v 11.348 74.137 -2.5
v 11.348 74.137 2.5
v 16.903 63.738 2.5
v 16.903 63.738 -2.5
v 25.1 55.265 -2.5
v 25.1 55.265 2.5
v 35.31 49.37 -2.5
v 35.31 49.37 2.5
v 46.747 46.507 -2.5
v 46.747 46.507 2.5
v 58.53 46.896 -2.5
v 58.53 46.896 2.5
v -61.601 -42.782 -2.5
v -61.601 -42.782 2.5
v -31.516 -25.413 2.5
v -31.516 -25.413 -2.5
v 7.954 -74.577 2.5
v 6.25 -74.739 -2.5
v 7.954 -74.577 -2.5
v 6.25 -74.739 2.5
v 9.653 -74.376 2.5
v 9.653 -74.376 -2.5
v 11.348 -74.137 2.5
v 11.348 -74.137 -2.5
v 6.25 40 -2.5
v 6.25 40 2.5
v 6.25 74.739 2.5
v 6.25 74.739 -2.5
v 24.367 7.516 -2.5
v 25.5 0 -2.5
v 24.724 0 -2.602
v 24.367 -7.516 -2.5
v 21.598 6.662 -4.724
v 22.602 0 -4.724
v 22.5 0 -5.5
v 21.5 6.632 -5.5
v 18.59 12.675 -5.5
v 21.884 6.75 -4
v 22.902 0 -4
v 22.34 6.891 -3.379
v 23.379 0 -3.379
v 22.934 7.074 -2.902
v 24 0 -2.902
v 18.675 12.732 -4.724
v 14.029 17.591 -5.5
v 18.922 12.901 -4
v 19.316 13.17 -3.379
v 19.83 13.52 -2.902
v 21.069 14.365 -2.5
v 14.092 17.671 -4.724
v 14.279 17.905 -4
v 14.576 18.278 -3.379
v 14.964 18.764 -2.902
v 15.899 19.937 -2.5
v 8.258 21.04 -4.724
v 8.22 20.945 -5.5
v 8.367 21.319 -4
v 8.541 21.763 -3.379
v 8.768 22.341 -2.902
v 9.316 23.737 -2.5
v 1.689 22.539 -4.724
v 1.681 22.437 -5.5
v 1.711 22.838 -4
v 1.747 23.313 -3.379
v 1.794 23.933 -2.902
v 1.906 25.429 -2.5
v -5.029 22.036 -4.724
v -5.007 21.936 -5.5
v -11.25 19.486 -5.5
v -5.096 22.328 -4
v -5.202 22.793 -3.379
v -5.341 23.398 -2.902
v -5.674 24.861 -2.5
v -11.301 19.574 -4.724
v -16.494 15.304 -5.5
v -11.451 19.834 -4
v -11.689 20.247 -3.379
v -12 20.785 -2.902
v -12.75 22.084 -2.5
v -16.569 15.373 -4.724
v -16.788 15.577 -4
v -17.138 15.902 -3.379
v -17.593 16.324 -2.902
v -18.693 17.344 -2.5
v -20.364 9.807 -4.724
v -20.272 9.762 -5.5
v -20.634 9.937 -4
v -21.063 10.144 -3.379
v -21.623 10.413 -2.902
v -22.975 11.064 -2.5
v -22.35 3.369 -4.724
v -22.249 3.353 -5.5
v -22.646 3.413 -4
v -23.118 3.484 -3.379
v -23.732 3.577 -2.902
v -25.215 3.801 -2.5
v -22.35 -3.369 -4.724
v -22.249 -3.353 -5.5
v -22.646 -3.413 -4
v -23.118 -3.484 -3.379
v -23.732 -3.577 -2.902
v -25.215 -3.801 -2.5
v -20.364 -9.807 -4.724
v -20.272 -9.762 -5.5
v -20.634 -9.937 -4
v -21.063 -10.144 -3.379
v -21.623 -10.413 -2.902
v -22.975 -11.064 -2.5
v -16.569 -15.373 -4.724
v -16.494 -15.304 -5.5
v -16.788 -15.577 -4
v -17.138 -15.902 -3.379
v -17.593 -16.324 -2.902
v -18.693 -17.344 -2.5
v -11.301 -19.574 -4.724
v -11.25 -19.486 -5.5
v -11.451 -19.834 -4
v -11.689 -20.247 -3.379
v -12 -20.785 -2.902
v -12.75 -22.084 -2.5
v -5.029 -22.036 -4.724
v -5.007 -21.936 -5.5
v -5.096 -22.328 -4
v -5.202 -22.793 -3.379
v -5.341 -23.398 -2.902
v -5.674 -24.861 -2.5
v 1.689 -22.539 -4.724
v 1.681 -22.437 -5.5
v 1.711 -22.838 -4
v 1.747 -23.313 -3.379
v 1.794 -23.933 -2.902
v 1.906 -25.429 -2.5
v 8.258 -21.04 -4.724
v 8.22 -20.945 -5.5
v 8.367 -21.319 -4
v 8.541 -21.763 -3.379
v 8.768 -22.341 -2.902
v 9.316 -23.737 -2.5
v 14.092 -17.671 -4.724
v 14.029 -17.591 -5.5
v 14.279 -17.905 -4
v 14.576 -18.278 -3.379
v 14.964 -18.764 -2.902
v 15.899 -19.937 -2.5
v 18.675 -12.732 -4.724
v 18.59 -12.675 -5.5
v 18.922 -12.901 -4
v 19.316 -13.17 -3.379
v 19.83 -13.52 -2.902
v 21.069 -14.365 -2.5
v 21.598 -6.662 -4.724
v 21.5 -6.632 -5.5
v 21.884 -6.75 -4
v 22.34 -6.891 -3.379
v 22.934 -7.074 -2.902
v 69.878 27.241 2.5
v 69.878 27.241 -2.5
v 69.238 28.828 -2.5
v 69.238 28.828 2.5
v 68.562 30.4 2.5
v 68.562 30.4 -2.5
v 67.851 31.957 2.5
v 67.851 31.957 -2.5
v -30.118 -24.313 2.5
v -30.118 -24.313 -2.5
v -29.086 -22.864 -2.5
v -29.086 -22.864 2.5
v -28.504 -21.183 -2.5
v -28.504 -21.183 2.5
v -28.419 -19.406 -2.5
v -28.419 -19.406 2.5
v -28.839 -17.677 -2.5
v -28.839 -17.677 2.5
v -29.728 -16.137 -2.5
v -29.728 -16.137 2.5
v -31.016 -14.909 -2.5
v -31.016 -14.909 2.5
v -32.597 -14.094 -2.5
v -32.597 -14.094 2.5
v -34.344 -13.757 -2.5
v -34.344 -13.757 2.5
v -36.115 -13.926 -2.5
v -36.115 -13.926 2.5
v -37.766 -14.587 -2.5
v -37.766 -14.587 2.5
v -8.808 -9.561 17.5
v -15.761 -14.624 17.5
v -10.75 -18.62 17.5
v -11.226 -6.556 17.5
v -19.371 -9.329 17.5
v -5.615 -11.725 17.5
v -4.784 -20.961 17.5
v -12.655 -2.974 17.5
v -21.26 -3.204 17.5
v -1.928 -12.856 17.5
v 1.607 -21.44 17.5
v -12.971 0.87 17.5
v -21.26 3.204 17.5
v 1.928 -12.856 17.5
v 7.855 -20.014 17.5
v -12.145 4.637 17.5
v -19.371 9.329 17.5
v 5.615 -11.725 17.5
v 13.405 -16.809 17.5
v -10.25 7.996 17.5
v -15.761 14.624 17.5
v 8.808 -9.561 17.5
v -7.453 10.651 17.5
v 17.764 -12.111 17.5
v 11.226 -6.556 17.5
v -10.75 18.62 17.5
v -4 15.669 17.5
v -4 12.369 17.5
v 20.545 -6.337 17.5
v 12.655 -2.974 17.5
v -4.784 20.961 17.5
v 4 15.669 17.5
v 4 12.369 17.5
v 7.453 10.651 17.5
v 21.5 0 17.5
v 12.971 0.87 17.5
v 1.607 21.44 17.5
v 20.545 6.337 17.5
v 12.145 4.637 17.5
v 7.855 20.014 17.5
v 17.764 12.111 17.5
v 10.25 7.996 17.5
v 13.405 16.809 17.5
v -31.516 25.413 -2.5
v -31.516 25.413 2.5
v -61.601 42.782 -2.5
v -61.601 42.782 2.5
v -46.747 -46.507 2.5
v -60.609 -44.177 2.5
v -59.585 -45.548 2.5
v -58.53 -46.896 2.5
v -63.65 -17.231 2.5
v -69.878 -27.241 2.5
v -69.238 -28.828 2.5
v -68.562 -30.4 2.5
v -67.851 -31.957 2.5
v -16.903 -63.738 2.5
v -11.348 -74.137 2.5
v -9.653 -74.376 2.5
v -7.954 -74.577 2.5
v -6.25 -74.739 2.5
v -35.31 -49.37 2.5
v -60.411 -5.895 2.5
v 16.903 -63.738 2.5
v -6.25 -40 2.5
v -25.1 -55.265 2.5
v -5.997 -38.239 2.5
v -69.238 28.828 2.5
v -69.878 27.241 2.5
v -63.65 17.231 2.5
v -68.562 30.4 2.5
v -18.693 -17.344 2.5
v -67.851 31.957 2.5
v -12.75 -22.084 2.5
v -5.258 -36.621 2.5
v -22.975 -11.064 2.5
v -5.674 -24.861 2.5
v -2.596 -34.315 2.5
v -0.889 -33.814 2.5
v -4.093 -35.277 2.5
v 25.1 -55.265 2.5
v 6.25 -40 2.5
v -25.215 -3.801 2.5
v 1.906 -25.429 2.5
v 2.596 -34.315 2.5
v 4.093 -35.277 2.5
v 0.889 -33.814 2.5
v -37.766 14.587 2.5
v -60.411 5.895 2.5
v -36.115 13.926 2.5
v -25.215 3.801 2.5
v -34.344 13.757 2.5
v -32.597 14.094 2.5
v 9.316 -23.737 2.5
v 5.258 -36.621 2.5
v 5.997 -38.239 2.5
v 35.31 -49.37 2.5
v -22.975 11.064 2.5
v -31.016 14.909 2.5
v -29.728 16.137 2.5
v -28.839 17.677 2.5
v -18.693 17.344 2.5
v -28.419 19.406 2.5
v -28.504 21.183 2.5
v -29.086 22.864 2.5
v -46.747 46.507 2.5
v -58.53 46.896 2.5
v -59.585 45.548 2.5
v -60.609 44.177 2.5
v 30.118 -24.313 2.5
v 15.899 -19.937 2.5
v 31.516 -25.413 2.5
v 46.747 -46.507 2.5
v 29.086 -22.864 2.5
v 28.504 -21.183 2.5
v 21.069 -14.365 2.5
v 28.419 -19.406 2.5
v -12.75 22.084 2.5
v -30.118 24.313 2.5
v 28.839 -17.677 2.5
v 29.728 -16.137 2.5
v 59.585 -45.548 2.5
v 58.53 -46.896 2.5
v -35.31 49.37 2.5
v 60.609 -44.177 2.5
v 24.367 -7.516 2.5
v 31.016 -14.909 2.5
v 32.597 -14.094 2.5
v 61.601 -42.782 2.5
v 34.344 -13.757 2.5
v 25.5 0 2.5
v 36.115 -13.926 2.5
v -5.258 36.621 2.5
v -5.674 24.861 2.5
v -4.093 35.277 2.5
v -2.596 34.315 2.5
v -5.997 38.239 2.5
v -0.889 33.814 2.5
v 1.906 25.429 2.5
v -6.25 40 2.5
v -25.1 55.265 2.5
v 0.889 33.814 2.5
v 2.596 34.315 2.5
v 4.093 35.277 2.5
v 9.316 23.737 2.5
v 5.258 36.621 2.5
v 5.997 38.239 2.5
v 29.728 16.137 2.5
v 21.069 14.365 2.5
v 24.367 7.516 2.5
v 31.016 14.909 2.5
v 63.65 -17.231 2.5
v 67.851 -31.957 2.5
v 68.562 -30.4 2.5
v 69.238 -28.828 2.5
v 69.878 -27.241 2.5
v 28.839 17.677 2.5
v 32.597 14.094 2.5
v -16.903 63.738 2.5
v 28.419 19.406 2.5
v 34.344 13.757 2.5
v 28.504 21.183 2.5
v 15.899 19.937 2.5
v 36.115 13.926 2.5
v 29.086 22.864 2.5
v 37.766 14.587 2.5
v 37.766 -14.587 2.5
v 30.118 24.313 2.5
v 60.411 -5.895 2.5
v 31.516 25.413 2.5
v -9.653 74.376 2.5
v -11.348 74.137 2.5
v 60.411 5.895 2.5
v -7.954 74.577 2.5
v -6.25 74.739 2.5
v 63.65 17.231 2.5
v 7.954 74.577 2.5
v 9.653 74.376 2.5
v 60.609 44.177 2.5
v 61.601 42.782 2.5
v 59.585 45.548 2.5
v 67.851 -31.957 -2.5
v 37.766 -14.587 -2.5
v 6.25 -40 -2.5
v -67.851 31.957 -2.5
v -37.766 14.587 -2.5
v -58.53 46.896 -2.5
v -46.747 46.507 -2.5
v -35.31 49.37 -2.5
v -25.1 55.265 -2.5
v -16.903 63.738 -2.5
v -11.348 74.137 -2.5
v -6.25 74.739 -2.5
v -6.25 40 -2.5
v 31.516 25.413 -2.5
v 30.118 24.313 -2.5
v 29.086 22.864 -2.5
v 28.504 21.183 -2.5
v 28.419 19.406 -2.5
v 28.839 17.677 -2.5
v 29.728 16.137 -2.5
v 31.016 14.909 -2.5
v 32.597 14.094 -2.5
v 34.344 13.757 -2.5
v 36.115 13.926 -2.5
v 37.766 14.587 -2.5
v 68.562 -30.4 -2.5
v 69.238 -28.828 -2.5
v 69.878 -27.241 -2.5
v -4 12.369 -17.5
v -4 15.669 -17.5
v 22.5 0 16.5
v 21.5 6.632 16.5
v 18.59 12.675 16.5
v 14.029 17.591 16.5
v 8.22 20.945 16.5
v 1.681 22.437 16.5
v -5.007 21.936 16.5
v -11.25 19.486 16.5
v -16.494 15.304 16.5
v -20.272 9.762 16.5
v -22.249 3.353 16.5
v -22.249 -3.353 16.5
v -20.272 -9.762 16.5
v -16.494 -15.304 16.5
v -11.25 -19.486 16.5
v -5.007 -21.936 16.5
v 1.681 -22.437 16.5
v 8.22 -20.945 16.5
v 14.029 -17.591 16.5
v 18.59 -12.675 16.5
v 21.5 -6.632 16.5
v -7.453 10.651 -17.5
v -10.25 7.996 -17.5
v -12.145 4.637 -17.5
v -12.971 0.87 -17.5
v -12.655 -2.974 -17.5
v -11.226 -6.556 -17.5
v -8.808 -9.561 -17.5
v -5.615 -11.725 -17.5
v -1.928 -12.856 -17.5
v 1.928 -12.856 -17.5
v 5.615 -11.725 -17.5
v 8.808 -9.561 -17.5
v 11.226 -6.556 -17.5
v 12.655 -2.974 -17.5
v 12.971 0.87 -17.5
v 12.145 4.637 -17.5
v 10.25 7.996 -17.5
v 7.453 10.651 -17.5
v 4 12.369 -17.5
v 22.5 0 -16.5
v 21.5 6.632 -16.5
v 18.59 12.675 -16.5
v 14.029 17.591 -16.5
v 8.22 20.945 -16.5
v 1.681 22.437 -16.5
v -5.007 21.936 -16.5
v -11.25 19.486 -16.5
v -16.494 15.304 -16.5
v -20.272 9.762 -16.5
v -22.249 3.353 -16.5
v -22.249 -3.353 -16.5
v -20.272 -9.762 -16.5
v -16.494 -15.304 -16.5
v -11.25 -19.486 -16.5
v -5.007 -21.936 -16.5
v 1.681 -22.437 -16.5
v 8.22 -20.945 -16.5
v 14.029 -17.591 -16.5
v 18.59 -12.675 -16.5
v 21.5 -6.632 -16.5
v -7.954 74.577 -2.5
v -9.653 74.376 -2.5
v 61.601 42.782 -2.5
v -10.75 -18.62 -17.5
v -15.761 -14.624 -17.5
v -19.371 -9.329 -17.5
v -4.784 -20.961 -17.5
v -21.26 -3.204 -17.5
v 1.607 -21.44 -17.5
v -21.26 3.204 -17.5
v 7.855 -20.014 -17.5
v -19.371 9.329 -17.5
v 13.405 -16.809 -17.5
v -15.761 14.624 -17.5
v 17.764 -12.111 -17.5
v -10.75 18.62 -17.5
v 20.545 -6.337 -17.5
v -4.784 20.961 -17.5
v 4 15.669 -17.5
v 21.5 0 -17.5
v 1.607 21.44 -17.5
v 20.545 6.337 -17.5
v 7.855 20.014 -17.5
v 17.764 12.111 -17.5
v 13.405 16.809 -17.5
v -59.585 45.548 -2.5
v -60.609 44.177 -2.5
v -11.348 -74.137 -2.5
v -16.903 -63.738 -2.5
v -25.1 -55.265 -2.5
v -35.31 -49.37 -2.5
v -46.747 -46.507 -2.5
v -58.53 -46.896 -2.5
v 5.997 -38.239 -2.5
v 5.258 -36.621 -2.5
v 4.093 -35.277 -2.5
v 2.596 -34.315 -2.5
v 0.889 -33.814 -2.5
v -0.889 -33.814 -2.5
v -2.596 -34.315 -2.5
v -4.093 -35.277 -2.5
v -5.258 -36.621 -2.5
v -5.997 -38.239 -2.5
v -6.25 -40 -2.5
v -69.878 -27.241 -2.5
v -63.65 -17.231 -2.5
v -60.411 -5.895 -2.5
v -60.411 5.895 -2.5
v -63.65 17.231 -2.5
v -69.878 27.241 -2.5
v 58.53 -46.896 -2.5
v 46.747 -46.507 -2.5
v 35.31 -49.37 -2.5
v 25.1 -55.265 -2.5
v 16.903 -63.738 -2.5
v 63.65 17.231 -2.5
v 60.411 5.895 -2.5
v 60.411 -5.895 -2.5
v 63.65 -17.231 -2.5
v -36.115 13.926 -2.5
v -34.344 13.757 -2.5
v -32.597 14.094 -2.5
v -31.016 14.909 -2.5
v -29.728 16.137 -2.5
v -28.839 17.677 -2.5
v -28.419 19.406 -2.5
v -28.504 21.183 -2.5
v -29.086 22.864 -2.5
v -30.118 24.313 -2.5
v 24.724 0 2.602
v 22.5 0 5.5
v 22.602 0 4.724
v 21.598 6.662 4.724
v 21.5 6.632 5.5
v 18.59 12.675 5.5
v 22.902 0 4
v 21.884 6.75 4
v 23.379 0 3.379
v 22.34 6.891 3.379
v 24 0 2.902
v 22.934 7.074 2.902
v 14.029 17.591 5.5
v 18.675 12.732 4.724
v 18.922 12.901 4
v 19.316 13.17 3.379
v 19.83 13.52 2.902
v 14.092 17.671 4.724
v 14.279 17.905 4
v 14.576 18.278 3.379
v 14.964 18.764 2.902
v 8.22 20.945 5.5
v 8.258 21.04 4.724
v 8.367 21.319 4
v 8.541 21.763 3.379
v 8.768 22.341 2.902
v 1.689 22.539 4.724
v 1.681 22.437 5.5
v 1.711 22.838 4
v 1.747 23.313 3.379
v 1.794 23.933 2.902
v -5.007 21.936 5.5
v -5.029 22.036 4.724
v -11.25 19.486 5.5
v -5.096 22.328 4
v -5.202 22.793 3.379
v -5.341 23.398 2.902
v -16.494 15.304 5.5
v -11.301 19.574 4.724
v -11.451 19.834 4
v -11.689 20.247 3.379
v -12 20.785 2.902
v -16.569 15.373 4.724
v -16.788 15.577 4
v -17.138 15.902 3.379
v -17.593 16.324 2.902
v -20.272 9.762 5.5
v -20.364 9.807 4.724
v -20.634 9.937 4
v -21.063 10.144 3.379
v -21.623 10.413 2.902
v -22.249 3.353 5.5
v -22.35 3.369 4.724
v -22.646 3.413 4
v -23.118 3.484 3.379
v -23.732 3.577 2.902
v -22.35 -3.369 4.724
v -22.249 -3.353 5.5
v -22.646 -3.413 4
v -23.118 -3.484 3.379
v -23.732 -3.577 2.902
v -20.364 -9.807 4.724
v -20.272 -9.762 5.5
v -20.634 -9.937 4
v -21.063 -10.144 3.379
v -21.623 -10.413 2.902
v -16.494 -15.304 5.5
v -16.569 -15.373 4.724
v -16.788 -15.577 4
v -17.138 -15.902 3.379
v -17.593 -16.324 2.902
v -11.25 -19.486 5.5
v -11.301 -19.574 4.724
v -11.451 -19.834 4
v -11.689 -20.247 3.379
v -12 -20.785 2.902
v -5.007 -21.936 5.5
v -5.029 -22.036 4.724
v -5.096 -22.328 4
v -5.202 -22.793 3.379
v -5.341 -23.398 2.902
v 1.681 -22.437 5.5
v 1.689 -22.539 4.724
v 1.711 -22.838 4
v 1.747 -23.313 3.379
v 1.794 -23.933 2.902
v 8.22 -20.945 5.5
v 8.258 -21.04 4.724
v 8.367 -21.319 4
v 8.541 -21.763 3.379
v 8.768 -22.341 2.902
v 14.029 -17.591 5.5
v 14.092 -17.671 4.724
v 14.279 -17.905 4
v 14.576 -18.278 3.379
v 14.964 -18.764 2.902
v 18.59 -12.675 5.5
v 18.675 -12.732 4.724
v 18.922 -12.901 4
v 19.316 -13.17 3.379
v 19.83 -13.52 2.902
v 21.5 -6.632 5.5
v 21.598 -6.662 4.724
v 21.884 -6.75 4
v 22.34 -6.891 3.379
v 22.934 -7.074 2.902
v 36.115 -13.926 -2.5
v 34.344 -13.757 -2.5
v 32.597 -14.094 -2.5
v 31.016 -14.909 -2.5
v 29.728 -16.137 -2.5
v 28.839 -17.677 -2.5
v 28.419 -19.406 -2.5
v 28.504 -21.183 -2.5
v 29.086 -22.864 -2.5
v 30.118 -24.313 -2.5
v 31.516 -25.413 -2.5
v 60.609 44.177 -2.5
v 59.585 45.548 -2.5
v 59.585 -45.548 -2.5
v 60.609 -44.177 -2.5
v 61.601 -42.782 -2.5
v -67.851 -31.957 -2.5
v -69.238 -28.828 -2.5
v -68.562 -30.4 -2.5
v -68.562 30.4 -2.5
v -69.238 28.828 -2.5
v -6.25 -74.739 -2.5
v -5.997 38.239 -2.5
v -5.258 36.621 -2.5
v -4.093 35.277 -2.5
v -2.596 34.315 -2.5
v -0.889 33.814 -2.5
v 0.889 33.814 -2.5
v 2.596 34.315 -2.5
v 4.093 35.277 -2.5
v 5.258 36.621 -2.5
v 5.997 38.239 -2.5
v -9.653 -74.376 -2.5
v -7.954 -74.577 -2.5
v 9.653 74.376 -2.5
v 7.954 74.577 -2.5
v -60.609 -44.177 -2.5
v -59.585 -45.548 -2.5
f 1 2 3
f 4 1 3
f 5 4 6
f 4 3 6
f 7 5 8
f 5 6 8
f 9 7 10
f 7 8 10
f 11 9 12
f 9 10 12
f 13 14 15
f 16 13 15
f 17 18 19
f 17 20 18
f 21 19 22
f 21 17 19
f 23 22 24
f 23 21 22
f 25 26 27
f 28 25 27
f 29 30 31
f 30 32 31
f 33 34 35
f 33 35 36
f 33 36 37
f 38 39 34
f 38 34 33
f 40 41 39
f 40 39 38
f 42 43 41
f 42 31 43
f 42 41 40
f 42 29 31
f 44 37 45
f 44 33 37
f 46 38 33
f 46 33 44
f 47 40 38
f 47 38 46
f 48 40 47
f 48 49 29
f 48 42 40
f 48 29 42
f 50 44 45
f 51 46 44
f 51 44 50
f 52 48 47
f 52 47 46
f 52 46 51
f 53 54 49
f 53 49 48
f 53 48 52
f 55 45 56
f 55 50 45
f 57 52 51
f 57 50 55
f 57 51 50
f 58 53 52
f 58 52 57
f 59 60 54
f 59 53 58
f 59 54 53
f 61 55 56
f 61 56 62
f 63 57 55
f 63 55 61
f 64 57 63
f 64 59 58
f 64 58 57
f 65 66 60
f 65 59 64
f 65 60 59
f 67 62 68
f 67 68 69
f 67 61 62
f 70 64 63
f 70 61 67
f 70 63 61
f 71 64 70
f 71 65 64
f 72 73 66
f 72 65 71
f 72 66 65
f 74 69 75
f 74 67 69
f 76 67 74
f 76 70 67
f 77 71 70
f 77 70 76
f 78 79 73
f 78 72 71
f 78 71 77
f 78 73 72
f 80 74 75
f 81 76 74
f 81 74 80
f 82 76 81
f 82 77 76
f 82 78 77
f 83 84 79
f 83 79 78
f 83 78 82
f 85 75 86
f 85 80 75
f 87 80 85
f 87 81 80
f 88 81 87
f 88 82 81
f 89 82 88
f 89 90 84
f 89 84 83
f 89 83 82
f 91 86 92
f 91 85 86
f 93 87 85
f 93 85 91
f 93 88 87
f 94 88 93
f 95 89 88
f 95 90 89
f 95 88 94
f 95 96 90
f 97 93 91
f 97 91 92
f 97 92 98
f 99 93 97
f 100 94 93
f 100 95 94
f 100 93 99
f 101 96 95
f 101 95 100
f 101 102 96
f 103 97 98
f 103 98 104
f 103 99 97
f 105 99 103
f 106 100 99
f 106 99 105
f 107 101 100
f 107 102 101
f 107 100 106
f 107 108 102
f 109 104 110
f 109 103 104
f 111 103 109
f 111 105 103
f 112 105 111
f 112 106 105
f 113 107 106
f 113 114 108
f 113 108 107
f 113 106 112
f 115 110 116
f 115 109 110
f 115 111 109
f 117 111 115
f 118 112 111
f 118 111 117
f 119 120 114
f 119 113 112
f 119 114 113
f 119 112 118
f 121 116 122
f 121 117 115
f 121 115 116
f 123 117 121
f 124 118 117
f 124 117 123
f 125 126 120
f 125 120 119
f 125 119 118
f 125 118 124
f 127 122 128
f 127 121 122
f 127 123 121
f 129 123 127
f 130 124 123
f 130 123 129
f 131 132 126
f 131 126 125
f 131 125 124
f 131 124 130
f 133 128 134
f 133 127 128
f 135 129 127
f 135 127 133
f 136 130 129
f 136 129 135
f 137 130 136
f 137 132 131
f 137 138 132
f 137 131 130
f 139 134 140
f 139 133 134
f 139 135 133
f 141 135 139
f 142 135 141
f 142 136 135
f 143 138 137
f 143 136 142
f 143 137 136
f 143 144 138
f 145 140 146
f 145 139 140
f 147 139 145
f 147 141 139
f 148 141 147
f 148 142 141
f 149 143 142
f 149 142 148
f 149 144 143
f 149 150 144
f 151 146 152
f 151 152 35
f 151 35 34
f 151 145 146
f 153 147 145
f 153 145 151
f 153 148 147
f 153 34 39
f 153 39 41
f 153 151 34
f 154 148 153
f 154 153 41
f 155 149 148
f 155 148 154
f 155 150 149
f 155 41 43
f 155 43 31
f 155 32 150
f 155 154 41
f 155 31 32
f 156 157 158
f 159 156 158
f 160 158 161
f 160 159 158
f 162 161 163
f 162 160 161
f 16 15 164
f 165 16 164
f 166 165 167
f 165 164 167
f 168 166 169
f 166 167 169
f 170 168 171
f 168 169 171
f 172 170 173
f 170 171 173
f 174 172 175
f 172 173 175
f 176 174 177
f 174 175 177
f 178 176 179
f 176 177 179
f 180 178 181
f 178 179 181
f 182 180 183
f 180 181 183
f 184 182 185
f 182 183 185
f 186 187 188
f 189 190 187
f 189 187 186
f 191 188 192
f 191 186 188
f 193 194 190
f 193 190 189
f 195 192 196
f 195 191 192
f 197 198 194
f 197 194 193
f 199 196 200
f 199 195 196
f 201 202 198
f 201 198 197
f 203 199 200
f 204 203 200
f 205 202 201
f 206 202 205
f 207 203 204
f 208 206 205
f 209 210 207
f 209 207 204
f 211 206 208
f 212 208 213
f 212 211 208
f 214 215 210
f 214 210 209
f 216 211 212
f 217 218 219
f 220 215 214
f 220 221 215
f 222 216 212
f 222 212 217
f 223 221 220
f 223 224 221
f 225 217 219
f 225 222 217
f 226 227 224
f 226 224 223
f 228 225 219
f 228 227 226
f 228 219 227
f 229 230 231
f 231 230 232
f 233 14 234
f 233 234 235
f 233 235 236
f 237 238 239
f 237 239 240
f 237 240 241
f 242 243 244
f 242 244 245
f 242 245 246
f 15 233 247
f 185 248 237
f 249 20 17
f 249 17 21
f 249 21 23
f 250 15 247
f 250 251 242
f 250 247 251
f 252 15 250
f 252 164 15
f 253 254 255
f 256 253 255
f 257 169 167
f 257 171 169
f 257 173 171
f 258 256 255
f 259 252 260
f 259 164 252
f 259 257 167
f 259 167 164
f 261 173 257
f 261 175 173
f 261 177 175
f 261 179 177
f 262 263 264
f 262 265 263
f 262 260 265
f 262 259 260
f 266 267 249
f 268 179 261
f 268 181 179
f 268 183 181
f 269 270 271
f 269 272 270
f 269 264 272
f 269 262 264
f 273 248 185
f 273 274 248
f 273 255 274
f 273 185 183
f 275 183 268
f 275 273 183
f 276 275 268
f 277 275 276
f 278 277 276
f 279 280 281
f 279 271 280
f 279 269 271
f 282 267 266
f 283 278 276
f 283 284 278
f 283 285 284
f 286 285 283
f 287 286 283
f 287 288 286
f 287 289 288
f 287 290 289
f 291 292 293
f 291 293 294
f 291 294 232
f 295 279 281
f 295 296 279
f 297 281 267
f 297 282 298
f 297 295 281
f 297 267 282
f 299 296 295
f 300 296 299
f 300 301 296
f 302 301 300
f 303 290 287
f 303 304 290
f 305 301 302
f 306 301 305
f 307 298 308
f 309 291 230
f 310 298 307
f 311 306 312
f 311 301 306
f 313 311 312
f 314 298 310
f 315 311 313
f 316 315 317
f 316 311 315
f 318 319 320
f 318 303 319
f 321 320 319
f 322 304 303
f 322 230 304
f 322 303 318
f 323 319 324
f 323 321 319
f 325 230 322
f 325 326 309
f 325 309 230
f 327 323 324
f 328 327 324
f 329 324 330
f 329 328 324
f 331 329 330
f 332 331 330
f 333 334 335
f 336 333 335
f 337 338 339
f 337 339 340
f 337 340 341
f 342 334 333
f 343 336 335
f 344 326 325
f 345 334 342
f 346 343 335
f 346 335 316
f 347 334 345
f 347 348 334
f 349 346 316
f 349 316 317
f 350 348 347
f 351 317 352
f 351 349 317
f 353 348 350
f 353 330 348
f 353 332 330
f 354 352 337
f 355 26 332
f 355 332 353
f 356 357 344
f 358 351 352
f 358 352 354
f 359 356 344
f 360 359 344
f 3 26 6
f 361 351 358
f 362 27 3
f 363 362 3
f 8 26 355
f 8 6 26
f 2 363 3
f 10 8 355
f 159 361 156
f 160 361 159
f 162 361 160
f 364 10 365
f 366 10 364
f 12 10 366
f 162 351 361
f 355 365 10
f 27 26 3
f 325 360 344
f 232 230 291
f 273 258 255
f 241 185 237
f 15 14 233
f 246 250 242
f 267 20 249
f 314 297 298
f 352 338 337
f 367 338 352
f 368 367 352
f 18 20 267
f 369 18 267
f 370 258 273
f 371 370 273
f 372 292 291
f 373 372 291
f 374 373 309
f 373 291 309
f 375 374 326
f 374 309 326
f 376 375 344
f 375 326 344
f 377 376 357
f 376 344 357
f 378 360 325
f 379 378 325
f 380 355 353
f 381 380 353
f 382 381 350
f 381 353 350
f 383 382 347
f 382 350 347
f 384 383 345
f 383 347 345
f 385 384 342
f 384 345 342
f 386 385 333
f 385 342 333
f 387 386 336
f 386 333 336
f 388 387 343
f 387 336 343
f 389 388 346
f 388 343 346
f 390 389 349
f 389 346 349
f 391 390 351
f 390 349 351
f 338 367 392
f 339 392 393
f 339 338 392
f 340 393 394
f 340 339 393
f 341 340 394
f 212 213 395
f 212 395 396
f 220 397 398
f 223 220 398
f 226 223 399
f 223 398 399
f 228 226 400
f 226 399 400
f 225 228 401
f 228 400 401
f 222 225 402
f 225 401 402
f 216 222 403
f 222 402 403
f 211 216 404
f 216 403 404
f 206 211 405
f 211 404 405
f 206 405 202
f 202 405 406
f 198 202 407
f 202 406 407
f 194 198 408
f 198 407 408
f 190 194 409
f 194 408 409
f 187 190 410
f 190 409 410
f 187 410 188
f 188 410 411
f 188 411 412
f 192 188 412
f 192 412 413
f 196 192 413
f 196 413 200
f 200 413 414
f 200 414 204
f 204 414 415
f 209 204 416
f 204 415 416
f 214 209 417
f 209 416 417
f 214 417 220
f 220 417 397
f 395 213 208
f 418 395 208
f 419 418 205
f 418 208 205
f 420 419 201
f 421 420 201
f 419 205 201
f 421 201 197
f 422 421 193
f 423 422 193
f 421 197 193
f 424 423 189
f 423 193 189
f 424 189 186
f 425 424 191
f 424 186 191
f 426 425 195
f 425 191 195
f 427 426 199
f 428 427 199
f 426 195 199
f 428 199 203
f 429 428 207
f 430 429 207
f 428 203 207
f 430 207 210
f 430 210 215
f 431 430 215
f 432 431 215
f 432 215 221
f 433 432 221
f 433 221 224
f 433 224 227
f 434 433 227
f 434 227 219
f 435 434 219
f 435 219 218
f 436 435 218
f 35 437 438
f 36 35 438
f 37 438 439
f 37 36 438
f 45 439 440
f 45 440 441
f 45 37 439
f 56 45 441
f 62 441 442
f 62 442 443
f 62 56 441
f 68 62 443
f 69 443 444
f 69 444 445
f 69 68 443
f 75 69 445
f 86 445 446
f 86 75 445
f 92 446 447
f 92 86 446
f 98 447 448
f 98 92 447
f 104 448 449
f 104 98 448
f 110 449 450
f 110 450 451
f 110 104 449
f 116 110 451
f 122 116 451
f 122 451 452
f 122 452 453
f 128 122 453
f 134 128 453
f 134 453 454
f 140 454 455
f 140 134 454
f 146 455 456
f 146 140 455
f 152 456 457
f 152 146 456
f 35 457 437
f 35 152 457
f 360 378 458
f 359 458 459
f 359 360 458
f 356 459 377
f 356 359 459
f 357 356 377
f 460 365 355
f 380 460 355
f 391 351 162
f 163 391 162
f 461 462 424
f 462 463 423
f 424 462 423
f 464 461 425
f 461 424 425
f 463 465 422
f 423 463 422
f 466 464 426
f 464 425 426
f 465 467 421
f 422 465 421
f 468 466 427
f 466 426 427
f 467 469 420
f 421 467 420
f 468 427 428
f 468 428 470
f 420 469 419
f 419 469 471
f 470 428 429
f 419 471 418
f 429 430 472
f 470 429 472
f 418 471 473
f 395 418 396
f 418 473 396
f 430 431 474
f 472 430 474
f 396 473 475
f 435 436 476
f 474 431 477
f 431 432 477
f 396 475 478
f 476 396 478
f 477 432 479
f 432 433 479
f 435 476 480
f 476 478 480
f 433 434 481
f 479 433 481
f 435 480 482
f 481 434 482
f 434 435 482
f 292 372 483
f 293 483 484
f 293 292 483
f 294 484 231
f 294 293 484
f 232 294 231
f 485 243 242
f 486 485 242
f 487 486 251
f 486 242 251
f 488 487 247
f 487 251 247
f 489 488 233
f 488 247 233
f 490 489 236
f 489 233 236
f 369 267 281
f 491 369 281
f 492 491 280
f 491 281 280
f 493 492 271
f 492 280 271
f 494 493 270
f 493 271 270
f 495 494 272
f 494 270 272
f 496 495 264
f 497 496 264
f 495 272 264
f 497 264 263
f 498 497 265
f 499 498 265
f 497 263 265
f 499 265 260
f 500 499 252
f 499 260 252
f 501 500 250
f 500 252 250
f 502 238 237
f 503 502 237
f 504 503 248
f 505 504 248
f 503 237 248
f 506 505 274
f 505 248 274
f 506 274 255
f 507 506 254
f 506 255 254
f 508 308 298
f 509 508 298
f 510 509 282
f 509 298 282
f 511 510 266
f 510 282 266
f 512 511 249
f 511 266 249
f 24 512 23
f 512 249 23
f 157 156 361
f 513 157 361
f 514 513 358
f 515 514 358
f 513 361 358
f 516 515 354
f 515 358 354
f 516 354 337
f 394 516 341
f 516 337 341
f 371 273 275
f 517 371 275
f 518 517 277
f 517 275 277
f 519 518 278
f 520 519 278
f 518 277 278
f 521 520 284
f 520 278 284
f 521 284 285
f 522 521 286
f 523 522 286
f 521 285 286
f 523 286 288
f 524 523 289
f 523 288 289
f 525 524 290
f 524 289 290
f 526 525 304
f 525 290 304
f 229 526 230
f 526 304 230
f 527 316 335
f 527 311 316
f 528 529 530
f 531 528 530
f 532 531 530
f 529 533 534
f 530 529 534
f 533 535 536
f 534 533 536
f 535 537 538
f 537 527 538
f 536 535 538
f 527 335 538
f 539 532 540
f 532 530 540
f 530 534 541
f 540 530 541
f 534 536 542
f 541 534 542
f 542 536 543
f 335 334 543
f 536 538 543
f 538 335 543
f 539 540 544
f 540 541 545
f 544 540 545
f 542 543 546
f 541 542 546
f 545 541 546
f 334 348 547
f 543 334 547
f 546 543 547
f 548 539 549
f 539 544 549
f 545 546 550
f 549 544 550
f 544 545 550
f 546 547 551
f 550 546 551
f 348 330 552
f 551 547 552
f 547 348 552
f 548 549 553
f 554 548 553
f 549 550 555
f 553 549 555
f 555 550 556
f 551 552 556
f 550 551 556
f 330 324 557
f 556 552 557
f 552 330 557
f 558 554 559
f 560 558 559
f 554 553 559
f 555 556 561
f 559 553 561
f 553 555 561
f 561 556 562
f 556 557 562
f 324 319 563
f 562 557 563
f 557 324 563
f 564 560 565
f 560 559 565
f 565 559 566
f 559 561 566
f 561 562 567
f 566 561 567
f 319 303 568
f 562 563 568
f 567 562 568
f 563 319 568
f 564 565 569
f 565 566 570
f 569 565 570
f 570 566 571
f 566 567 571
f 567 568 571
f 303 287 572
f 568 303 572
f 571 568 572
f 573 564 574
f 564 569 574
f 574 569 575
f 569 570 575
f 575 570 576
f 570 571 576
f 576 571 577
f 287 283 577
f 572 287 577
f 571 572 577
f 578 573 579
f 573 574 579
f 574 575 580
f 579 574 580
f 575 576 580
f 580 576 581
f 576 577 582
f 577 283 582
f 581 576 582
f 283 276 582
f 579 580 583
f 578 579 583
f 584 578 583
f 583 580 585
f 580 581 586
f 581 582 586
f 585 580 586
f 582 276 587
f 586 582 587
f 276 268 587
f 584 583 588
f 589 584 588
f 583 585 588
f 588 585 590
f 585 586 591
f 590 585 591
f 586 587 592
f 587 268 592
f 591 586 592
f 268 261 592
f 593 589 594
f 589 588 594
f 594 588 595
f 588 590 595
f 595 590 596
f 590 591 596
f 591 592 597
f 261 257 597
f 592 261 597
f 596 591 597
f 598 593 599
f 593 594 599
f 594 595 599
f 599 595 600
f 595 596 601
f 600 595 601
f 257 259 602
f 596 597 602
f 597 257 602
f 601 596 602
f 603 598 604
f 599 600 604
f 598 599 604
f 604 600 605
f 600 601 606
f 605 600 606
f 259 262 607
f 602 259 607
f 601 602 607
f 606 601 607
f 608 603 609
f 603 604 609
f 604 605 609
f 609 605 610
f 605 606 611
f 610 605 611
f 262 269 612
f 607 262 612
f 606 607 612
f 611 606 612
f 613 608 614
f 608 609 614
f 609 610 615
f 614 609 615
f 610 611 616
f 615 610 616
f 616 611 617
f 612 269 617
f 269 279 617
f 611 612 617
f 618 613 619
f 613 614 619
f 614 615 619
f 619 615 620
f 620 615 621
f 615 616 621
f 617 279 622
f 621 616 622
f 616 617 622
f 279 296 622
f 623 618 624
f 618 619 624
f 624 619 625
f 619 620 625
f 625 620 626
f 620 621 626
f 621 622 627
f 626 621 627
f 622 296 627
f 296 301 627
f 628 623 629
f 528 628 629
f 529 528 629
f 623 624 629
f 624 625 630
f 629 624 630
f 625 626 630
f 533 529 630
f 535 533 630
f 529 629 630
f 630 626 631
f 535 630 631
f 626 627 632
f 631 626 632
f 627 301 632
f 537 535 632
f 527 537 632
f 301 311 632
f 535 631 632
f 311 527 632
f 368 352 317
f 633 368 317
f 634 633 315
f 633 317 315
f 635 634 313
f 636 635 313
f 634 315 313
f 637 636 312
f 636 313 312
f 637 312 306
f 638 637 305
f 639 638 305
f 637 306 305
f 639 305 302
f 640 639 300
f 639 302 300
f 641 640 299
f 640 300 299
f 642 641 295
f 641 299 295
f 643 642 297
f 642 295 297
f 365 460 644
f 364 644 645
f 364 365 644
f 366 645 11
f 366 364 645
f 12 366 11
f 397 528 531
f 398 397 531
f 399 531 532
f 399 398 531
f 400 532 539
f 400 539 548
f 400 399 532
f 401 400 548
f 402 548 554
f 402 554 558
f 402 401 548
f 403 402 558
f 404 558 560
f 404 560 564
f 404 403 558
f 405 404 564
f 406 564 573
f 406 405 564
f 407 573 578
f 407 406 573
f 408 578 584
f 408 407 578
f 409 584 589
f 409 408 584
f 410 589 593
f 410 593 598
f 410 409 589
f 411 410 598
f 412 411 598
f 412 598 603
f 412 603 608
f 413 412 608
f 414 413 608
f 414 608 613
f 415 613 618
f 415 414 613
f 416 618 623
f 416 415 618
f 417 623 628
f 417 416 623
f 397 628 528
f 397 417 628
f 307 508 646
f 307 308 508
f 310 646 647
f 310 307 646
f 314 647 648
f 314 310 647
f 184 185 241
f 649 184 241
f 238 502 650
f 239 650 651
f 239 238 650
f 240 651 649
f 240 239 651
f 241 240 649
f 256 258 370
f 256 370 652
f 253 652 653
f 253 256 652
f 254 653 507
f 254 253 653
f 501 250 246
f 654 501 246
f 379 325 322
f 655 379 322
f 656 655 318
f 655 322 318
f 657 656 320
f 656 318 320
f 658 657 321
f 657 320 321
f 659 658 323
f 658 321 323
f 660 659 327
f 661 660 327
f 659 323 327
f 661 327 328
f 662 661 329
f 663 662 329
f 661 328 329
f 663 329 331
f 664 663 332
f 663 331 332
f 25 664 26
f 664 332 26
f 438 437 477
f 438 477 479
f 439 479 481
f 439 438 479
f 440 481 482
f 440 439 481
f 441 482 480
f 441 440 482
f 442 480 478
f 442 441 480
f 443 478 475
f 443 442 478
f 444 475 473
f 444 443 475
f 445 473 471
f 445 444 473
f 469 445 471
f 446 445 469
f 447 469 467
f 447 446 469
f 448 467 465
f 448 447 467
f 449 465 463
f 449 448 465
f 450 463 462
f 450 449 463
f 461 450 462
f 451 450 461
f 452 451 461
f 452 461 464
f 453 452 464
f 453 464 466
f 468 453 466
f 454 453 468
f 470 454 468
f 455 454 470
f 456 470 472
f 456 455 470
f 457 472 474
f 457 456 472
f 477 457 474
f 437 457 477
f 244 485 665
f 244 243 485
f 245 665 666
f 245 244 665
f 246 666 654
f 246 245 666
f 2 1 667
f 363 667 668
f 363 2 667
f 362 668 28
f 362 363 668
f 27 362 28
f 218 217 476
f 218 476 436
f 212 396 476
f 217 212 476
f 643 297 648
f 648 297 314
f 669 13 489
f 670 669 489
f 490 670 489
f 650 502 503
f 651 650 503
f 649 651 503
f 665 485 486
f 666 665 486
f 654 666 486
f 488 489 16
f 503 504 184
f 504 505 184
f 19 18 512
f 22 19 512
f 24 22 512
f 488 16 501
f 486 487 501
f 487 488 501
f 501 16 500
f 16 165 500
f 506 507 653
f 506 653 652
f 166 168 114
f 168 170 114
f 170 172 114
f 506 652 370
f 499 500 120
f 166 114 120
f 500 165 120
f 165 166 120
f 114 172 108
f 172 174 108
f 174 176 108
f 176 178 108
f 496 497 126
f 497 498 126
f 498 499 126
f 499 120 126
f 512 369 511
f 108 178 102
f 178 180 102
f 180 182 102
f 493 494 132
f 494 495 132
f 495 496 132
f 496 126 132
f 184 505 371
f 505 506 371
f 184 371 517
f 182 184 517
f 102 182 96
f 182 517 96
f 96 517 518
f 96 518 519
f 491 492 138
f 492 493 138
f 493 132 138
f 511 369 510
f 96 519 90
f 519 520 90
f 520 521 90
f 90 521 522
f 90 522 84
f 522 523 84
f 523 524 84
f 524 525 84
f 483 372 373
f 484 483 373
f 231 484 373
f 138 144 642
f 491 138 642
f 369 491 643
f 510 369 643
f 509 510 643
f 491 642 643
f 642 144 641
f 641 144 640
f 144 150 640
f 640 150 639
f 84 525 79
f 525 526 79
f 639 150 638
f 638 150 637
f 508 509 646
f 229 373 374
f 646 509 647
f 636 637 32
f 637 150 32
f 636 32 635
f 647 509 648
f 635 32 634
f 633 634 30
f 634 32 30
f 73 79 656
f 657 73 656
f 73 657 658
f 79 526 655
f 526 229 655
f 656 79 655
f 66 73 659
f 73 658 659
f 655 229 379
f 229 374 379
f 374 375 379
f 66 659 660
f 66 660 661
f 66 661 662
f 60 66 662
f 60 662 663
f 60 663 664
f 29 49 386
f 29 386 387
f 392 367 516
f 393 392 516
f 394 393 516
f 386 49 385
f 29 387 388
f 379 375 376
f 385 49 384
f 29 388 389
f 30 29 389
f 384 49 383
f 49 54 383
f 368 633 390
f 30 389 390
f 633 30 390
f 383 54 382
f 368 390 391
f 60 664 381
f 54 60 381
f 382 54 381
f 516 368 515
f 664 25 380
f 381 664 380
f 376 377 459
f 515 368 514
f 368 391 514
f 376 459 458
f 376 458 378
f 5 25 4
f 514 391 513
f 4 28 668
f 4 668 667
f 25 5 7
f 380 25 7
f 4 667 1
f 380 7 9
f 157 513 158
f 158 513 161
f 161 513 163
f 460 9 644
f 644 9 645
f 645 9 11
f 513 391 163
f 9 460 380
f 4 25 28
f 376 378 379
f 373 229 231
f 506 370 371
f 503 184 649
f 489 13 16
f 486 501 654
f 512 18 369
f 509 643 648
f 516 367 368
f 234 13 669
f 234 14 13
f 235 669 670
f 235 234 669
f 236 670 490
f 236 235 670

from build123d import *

# Parameters (mm, degrees)
SKETCH1_R           = 75
BOSS_EXTRUDE1_DEPTH = 2.5
SKETCH2_R           = 22.5
BOSS_EXTRUDE2_DEPTH = 17.5
SKETCH3_R           = 13
CUT_EXTRUDE1_DEPTH  = 35
CUT_EXTRUDE2_DEPTH  = 35
CUT_EXTRUDE3_DEPTH  = 35
CHAMFER1_SIZE       = 1
FILLET1_R           = 3
CHAMFER2_SIZE       = 1


with BuildPart() as part:
    # Sketch1 → Boss-Extrude1 (new, symmetric)
    with BuildSketch(Plane.XY):
        Circle(SKETCH1_R)
    extrude(amount=BOSS_EXTRUDE1_DEPTH, both=True)

    # Sketch2 → Boss-Extrude2 (add, symmetric)
    with BuildSketch(Plane.XY):
        Circle(SKETCH2_R)
    extrude(amount=BOSS_EXTRUDE2_DEPTH, both=True)

    # Sketch3 → Cut-Extrude1 (cut)
    with BuildSketch(Plane.XY.offset(17.5)):
        Circle(SKETCH3_R)
    extrude(amount=-CUT_EXTRUDE1_DEPTH, mode=Mode.SUBTRACT)

    # Sketch4 → Cut-Extrude2 (cut)
    with BuildSketch(Plane.XY.offset(2.5)):
        with BuildLine():
            ThreePointArc((58.530203334, 46.895791897), (37.5, 64.951905284), (11.347845446, 74.136538925))
            ThreePointArc((11.347845446, 74.136538925), (30, 51.961524227), (58.530203334, 46.895791897))
        make_face()
        with BuildLine():
            ThreePointArc((67.850984929, 31.956906049), (64.951905284, 37.5), (61.600984929, 42.782223596))
            Line((61.600984929, 42.782223596), (31.516016151, 25.412658774))
            ThreePointArc((31.516016151, 25.412658774), (29.228357378, 16.875), (37.766016151, 14.587341226))
            Line((37.766016151, 14.587341226), (67.850984929, 31.956906049))
        make_face()
        with BuildLine():
            ThreePointArc((75, 0), (73.708390494, 13.85904653), (69.87804878, 27.240747028))
            ThreePointArc((69.87804878, 27.240747028), (60, 0), (69.87804878, -27.240747028))
            ThreePointArc((69.87804878, -27.240747028), (73.708390494, -13.85904653), (75, 0))
        make_face()
        with BuildLine():
            ThreePointArc((61.600984929, -42.782223596), (64.951905284, -37.5), (67.850984929, -31.956906049))
            Line((67.850984929, -31.956906049), (37.766016151, -14.587341226))
            ThreePointArc((37.766016151, -14.587341226), (29.228357378, -16.875), (31.516016151, -25.412658774))
            Line((31.516016151, -25.412658774), (61.600984929, -42.782223596))
        make_face()
        with BuildLine():
            ThreePointArc((11.347845446, -74.136538925), (37.5, -64.951905284), (58.530203334, -46.895791897))
            ThreePointArc((58.530203334, -46.895791897), (30, -51.961524227), (11.347845446, -74.136538925))
        make_face()
        with BuildLine():
            Line((-6.25, -40), (-6.25, -74.739129644))
            ThreePointArc((-6.25, -74.739129644), (0, -75), (6.25, -74.739129644))
            Line((6.25, -74.739129644), (6.25, -40))
            ThreePointArc((6.25, -40), (0, -33.75), (-6.25, -40))
        make_face()
        with BuildLine():
            ThreePointArc((-11.347845446, -74.136538925), (-30, -51.961524227), (-58.530203334, -46.895791897))
            ThreePointArc((-58.530203334, -46.895791897), (-37.5, -64.951905284), (-11.347845446, -74.136538925))
        make_face()
        with BuildLine():
            Line((-37.766016151, -14.587341226), (-67.850984929, -31.956906049))
            ThreePointArc((-67.850984929, -31.956906049), (-64.951905284, -37.5), (-61.600984929, -42.782223596))
            Line((-61.600984929, -42.782223596), (-31.516016151, -25.412658774))
            ThreePointArc((-31.516016151, -25.412658774), (-29.228357378, -16.875), (-37.766016151, -14.587341226))
        make_face()
        with BuildLine():
            ThreePointArc((-69.87804878, -27.240747028), (-60, 0), (-69.87804878, 27.240747028))
            ThreePointArc((-69.87804878, 27.240747028), (-75, 0), (-69.87804878, -27.240747028))
        make_face()
        with BuildLine():
            Line((-31.516016151, 25.412658774), (-61.600984929, 42.782223596))
            ThreePointArc((-61.600984929, 42.782223596), (-64.951905284, 37.5), (-67.850984929, 31.956906049))
            Line((-67.850984929, 31.956906049), (-37.766016151, 14.587341226))
            ThreePointArc((-37.766016151, 14.587341226), (-29.228357378, 16.875), (-31.516016151, 25.412658774))
        make_face()
        with BuildLine():
            ThreePointArc((-58.530203334, 46.895791897), (-30, 51.961524227), (-11.347845446, 74.136538925))
            ThreePointArc((-11.347845446, 74.136538925), (-37.5, 64.951905284), (-58.530203334, 46.895791897))
        make_face()
        with BuildLine():
            Line((-6.25, 74.739129644), (-6.25, 40))
            ThreePointArc((-6.25, 40), (0, 33.75), (6.25, 40))
            Line((6.25, 40), (6.25, 74.739129644))
            ThreePointArc((6.25, 74.739129644), (0, 75), (-6.25, 74.739129644))
        make_face()
    extrude(amount=-CUT_EXTRUDE2_DEPTH, mode=Mode.SUBTRACT)

    # Sketch5 → Cut-Extrude3 (cut)
    with BuildSketch(Plane.XY.offset(17.5)):
        with BuildLine():
            Line((-4, 12.369316877), (-4, 15.669316877))
            Line((-4, 15.669316877), (4, 15.669316877))
            Line((4, 15.669316877), (4, 12.369316877))
            ThreePointArc((4, 12.369316877), (0, 13), (-4, 12.369316877))
        make_face()
    extrude(amount=-CUT_EXTRUDE3_DEPTH, mode=Mode.SUBTRACT)

    # Chamfer1
    chamfer1_edges = [part.edges().sort_by_distance(p)[0] for p in [
        (-22.5, 0, 17.5),
    ]]
    chamfer(chamfer1_edges, length=CHAMFER1_SIZE)

    # Fillet1
    fillet1_edges = [part.edges().sort_by_distance(p)[0] for p in [
        (-22.5, 0, -2.5),
        (-22.5, 0, 2.5),
    ]]
    fillet(fillet1_edges, radius=FILLET1_R)

    # Chamfer2
    chamfer2_edges = [part.edges().sort_by_distance(p)[0] for p in [
        (-22.5, 0, -17.5),
    ]]
    chamfer(chamfer2_edges, length=CHAMFER2_SIZE)


solid = part.part
